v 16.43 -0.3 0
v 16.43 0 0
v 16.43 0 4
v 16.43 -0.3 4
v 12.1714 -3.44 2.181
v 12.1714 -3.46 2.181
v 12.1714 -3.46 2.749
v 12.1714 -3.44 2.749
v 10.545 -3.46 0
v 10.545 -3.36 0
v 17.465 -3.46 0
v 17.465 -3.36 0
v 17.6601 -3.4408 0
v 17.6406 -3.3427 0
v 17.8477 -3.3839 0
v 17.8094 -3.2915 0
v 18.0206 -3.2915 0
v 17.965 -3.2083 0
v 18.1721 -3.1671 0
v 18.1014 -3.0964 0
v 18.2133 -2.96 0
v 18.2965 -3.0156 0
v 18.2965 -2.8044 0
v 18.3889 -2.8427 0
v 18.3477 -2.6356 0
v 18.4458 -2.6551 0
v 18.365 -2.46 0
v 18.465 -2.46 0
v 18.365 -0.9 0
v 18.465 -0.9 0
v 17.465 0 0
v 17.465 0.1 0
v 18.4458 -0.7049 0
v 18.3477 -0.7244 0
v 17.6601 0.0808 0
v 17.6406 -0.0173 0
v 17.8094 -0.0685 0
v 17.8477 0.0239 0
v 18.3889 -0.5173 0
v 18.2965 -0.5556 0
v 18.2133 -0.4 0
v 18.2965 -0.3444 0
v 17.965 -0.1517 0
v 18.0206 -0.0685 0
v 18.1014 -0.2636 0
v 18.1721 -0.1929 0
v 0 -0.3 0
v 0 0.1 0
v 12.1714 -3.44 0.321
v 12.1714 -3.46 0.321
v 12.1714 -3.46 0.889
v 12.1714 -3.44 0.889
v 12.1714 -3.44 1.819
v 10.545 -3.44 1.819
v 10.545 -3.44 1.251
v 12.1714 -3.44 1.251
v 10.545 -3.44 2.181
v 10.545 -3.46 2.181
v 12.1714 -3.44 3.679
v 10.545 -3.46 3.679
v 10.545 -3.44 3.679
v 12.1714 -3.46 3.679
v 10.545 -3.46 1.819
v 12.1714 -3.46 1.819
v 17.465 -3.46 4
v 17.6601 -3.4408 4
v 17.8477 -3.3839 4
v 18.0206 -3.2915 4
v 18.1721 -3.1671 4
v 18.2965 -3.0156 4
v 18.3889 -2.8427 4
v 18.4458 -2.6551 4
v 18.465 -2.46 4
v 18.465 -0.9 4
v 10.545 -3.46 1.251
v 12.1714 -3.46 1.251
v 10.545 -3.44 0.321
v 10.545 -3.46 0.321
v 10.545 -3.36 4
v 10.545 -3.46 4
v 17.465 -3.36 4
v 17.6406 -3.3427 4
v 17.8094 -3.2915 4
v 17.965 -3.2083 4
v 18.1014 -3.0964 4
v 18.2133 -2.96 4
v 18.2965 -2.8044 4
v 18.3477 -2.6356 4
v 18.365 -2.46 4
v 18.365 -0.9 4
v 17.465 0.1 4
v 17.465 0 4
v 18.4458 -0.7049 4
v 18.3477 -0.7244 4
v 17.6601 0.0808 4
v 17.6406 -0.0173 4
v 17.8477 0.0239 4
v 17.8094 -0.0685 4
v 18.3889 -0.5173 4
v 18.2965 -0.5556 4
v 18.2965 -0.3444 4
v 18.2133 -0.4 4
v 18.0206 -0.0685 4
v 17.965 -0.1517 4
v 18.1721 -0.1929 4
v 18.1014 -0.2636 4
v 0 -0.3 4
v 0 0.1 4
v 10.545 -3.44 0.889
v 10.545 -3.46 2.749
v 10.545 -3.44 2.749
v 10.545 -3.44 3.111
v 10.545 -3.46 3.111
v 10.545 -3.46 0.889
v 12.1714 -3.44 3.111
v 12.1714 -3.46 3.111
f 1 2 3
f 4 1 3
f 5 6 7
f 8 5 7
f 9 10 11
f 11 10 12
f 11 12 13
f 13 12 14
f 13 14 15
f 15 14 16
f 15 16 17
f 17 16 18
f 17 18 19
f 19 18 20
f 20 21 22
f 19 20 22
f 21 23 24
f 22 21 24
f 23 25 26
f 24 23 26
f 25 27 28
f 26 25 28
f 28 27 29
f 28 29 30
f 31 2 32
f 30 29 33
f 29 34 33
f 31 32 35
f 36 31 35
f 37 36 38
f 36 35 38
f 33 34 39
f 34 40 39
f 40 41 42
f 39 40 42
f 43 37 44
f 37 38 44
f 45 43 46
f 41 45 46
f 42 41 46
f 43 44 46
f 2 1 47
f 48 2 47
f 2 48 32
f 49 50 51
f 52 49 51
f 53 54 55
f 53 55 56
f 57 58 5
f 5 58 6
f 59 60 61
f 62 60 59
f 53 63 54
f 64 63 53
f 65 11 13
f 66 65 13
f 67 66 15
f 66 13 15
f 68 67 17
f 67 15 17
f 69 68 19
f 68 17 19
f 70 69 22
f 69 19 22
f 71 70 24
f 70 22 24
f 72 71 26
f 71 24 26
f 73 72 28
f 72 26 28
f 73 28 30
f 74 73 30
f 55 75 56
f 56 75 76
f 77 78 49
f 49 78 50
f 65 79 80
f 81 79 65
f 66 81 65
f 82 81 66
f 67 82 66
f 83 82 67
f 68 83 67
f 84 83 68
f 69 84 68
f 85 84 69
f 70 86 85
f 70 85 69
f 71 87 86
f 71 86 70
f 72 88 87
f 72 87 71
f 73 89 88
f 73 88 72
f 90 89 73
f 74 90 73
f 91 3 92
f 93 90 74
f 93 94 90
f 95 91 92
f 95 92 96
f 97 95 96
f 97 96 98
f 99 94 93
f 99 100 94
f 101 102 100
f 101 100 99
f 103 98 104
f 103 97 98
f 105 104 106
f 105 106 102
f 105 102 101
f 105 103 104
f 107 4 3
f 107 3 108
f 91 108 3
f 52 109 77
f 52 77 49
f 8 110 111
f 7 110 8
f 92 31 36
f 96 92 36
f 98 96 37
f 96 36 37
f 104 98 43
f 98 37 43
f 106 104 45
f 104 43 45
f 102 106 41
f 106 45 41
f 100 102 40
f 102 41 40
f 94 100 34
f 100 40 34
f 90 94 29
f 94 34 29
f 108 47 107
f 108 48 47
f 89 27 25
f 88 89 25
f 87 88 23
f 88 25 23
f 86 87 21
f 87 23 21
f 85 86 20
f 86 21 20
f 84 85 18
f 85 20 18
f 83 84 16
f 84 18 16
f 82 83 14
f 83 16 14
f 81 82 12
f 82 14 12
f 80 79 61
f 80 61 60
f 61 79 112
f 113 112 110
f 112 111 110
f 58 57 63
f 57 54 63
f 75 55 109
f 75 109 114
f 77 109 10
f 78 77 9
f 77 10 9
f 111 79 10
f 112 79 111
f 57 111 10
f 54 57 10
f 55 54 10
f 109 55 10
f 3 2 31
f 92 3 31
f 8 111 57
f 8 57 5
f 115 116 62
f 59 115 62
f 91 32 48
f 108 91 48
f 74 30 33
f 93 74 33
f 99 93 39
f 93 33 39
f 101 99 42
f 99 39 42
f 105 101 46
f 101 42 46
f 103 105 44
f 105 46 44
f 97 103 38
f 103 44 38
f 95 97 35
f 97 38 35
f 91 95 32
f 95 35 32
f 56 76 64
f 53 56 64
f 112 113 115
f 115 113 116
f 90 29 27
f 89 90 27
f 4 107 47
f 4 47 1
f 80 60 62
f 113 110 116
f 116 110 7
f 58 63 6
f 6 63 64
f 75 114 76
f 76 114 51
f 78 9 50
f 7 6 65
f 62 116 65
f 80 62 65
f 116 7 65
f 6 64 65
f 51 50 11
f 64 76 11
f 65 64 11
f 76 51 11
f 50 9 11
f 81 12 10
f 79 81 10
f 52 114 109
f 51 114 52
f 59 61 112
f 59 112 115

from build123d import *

# Parameters (mm, degrees)
EXTRUDE_1_DEPTH     = 4
SKETCH_2_W          = 16.43
SKETCH_2_H          = 4
EXTRUDE_2_DEPTH     = 0.3
SKETCH_5_W          = 1.626393804
SKETCH_5_H          = 0.567965398
CUT_EXTRUDE_1_DEPTH = 0.02


with BuildPart() as part:
    # 草图1 → 凸台-拉伸1 (new body)
    with BuildSketch(Plane.XY):
        with BuildLine():
            Line((0, 0), (17.465, 0))
            ThreePointArc((17.465, 0), (18.101396103, -0.263603897), (18.365, -0.9))
            Line((18.365, -0.9), (18.365, -2.46))
            ThreePointArc((18.365, -2.46), (18.101396103, -3.096396103), (17.465, -3.36))
            Line((17.465, -3.36), (10.545, -3.36))
            Line((10.545, -3.36), (10.545, -3.46))
            Line((10.545, -3.46), (17.464999994, -3.46))
            ThreePointArc((17.464999994, -3.46), (18.172106779, -3.167106783), (18.465, -2.46))
            Line((18.465, -2.46), (18.465, -0.9))
            ThreePointArc((18.465, -0.9), (18.172106781, -0.192893219), (17.465, 0.1))
            Line((17.465, 0.1), (0, 0.1))
            Line((0, 0.1), (0, 0))
        make_face()
    extrude(amount=EXTRUDE_1_DEPTH)

    # 草图2 → 凸台-拉伸2 (add)
    with BuildSketch(Plane.XZ):
        with Locations((8.215, 2)):
            Rectangle(SKETCH_2_W, SKETCH_2_H)
    extrude(amount=EXTRUDE_2_DEPTH)

    # 草图5 → 切除-拉伸1 (cut)
    with BuildSketch(Plane.XZ.offset(3.46)):
        with Locations((11.358196902, 3.395)):
            Rectangle(SKETCH_5_W, SKETCH_5_H)
        with Locations((11.358196902, 2.465)):
            Rectangle(SKETCH_5_W, SKETCH_5_H)
        with Locations((11.358196902, 1.535)):
            Rectangle(SKETCH_5_W, SKETCH_5_H)
        with Locations((11.358196902, 0.605)):
            Rectangle(SKETCH_5_W, SKETCH_5_H)
    extrude(amount=-CUT_EXTRUDE_1_DEPTH, mode=Mode.SUBTRACT)


solid = part.part
